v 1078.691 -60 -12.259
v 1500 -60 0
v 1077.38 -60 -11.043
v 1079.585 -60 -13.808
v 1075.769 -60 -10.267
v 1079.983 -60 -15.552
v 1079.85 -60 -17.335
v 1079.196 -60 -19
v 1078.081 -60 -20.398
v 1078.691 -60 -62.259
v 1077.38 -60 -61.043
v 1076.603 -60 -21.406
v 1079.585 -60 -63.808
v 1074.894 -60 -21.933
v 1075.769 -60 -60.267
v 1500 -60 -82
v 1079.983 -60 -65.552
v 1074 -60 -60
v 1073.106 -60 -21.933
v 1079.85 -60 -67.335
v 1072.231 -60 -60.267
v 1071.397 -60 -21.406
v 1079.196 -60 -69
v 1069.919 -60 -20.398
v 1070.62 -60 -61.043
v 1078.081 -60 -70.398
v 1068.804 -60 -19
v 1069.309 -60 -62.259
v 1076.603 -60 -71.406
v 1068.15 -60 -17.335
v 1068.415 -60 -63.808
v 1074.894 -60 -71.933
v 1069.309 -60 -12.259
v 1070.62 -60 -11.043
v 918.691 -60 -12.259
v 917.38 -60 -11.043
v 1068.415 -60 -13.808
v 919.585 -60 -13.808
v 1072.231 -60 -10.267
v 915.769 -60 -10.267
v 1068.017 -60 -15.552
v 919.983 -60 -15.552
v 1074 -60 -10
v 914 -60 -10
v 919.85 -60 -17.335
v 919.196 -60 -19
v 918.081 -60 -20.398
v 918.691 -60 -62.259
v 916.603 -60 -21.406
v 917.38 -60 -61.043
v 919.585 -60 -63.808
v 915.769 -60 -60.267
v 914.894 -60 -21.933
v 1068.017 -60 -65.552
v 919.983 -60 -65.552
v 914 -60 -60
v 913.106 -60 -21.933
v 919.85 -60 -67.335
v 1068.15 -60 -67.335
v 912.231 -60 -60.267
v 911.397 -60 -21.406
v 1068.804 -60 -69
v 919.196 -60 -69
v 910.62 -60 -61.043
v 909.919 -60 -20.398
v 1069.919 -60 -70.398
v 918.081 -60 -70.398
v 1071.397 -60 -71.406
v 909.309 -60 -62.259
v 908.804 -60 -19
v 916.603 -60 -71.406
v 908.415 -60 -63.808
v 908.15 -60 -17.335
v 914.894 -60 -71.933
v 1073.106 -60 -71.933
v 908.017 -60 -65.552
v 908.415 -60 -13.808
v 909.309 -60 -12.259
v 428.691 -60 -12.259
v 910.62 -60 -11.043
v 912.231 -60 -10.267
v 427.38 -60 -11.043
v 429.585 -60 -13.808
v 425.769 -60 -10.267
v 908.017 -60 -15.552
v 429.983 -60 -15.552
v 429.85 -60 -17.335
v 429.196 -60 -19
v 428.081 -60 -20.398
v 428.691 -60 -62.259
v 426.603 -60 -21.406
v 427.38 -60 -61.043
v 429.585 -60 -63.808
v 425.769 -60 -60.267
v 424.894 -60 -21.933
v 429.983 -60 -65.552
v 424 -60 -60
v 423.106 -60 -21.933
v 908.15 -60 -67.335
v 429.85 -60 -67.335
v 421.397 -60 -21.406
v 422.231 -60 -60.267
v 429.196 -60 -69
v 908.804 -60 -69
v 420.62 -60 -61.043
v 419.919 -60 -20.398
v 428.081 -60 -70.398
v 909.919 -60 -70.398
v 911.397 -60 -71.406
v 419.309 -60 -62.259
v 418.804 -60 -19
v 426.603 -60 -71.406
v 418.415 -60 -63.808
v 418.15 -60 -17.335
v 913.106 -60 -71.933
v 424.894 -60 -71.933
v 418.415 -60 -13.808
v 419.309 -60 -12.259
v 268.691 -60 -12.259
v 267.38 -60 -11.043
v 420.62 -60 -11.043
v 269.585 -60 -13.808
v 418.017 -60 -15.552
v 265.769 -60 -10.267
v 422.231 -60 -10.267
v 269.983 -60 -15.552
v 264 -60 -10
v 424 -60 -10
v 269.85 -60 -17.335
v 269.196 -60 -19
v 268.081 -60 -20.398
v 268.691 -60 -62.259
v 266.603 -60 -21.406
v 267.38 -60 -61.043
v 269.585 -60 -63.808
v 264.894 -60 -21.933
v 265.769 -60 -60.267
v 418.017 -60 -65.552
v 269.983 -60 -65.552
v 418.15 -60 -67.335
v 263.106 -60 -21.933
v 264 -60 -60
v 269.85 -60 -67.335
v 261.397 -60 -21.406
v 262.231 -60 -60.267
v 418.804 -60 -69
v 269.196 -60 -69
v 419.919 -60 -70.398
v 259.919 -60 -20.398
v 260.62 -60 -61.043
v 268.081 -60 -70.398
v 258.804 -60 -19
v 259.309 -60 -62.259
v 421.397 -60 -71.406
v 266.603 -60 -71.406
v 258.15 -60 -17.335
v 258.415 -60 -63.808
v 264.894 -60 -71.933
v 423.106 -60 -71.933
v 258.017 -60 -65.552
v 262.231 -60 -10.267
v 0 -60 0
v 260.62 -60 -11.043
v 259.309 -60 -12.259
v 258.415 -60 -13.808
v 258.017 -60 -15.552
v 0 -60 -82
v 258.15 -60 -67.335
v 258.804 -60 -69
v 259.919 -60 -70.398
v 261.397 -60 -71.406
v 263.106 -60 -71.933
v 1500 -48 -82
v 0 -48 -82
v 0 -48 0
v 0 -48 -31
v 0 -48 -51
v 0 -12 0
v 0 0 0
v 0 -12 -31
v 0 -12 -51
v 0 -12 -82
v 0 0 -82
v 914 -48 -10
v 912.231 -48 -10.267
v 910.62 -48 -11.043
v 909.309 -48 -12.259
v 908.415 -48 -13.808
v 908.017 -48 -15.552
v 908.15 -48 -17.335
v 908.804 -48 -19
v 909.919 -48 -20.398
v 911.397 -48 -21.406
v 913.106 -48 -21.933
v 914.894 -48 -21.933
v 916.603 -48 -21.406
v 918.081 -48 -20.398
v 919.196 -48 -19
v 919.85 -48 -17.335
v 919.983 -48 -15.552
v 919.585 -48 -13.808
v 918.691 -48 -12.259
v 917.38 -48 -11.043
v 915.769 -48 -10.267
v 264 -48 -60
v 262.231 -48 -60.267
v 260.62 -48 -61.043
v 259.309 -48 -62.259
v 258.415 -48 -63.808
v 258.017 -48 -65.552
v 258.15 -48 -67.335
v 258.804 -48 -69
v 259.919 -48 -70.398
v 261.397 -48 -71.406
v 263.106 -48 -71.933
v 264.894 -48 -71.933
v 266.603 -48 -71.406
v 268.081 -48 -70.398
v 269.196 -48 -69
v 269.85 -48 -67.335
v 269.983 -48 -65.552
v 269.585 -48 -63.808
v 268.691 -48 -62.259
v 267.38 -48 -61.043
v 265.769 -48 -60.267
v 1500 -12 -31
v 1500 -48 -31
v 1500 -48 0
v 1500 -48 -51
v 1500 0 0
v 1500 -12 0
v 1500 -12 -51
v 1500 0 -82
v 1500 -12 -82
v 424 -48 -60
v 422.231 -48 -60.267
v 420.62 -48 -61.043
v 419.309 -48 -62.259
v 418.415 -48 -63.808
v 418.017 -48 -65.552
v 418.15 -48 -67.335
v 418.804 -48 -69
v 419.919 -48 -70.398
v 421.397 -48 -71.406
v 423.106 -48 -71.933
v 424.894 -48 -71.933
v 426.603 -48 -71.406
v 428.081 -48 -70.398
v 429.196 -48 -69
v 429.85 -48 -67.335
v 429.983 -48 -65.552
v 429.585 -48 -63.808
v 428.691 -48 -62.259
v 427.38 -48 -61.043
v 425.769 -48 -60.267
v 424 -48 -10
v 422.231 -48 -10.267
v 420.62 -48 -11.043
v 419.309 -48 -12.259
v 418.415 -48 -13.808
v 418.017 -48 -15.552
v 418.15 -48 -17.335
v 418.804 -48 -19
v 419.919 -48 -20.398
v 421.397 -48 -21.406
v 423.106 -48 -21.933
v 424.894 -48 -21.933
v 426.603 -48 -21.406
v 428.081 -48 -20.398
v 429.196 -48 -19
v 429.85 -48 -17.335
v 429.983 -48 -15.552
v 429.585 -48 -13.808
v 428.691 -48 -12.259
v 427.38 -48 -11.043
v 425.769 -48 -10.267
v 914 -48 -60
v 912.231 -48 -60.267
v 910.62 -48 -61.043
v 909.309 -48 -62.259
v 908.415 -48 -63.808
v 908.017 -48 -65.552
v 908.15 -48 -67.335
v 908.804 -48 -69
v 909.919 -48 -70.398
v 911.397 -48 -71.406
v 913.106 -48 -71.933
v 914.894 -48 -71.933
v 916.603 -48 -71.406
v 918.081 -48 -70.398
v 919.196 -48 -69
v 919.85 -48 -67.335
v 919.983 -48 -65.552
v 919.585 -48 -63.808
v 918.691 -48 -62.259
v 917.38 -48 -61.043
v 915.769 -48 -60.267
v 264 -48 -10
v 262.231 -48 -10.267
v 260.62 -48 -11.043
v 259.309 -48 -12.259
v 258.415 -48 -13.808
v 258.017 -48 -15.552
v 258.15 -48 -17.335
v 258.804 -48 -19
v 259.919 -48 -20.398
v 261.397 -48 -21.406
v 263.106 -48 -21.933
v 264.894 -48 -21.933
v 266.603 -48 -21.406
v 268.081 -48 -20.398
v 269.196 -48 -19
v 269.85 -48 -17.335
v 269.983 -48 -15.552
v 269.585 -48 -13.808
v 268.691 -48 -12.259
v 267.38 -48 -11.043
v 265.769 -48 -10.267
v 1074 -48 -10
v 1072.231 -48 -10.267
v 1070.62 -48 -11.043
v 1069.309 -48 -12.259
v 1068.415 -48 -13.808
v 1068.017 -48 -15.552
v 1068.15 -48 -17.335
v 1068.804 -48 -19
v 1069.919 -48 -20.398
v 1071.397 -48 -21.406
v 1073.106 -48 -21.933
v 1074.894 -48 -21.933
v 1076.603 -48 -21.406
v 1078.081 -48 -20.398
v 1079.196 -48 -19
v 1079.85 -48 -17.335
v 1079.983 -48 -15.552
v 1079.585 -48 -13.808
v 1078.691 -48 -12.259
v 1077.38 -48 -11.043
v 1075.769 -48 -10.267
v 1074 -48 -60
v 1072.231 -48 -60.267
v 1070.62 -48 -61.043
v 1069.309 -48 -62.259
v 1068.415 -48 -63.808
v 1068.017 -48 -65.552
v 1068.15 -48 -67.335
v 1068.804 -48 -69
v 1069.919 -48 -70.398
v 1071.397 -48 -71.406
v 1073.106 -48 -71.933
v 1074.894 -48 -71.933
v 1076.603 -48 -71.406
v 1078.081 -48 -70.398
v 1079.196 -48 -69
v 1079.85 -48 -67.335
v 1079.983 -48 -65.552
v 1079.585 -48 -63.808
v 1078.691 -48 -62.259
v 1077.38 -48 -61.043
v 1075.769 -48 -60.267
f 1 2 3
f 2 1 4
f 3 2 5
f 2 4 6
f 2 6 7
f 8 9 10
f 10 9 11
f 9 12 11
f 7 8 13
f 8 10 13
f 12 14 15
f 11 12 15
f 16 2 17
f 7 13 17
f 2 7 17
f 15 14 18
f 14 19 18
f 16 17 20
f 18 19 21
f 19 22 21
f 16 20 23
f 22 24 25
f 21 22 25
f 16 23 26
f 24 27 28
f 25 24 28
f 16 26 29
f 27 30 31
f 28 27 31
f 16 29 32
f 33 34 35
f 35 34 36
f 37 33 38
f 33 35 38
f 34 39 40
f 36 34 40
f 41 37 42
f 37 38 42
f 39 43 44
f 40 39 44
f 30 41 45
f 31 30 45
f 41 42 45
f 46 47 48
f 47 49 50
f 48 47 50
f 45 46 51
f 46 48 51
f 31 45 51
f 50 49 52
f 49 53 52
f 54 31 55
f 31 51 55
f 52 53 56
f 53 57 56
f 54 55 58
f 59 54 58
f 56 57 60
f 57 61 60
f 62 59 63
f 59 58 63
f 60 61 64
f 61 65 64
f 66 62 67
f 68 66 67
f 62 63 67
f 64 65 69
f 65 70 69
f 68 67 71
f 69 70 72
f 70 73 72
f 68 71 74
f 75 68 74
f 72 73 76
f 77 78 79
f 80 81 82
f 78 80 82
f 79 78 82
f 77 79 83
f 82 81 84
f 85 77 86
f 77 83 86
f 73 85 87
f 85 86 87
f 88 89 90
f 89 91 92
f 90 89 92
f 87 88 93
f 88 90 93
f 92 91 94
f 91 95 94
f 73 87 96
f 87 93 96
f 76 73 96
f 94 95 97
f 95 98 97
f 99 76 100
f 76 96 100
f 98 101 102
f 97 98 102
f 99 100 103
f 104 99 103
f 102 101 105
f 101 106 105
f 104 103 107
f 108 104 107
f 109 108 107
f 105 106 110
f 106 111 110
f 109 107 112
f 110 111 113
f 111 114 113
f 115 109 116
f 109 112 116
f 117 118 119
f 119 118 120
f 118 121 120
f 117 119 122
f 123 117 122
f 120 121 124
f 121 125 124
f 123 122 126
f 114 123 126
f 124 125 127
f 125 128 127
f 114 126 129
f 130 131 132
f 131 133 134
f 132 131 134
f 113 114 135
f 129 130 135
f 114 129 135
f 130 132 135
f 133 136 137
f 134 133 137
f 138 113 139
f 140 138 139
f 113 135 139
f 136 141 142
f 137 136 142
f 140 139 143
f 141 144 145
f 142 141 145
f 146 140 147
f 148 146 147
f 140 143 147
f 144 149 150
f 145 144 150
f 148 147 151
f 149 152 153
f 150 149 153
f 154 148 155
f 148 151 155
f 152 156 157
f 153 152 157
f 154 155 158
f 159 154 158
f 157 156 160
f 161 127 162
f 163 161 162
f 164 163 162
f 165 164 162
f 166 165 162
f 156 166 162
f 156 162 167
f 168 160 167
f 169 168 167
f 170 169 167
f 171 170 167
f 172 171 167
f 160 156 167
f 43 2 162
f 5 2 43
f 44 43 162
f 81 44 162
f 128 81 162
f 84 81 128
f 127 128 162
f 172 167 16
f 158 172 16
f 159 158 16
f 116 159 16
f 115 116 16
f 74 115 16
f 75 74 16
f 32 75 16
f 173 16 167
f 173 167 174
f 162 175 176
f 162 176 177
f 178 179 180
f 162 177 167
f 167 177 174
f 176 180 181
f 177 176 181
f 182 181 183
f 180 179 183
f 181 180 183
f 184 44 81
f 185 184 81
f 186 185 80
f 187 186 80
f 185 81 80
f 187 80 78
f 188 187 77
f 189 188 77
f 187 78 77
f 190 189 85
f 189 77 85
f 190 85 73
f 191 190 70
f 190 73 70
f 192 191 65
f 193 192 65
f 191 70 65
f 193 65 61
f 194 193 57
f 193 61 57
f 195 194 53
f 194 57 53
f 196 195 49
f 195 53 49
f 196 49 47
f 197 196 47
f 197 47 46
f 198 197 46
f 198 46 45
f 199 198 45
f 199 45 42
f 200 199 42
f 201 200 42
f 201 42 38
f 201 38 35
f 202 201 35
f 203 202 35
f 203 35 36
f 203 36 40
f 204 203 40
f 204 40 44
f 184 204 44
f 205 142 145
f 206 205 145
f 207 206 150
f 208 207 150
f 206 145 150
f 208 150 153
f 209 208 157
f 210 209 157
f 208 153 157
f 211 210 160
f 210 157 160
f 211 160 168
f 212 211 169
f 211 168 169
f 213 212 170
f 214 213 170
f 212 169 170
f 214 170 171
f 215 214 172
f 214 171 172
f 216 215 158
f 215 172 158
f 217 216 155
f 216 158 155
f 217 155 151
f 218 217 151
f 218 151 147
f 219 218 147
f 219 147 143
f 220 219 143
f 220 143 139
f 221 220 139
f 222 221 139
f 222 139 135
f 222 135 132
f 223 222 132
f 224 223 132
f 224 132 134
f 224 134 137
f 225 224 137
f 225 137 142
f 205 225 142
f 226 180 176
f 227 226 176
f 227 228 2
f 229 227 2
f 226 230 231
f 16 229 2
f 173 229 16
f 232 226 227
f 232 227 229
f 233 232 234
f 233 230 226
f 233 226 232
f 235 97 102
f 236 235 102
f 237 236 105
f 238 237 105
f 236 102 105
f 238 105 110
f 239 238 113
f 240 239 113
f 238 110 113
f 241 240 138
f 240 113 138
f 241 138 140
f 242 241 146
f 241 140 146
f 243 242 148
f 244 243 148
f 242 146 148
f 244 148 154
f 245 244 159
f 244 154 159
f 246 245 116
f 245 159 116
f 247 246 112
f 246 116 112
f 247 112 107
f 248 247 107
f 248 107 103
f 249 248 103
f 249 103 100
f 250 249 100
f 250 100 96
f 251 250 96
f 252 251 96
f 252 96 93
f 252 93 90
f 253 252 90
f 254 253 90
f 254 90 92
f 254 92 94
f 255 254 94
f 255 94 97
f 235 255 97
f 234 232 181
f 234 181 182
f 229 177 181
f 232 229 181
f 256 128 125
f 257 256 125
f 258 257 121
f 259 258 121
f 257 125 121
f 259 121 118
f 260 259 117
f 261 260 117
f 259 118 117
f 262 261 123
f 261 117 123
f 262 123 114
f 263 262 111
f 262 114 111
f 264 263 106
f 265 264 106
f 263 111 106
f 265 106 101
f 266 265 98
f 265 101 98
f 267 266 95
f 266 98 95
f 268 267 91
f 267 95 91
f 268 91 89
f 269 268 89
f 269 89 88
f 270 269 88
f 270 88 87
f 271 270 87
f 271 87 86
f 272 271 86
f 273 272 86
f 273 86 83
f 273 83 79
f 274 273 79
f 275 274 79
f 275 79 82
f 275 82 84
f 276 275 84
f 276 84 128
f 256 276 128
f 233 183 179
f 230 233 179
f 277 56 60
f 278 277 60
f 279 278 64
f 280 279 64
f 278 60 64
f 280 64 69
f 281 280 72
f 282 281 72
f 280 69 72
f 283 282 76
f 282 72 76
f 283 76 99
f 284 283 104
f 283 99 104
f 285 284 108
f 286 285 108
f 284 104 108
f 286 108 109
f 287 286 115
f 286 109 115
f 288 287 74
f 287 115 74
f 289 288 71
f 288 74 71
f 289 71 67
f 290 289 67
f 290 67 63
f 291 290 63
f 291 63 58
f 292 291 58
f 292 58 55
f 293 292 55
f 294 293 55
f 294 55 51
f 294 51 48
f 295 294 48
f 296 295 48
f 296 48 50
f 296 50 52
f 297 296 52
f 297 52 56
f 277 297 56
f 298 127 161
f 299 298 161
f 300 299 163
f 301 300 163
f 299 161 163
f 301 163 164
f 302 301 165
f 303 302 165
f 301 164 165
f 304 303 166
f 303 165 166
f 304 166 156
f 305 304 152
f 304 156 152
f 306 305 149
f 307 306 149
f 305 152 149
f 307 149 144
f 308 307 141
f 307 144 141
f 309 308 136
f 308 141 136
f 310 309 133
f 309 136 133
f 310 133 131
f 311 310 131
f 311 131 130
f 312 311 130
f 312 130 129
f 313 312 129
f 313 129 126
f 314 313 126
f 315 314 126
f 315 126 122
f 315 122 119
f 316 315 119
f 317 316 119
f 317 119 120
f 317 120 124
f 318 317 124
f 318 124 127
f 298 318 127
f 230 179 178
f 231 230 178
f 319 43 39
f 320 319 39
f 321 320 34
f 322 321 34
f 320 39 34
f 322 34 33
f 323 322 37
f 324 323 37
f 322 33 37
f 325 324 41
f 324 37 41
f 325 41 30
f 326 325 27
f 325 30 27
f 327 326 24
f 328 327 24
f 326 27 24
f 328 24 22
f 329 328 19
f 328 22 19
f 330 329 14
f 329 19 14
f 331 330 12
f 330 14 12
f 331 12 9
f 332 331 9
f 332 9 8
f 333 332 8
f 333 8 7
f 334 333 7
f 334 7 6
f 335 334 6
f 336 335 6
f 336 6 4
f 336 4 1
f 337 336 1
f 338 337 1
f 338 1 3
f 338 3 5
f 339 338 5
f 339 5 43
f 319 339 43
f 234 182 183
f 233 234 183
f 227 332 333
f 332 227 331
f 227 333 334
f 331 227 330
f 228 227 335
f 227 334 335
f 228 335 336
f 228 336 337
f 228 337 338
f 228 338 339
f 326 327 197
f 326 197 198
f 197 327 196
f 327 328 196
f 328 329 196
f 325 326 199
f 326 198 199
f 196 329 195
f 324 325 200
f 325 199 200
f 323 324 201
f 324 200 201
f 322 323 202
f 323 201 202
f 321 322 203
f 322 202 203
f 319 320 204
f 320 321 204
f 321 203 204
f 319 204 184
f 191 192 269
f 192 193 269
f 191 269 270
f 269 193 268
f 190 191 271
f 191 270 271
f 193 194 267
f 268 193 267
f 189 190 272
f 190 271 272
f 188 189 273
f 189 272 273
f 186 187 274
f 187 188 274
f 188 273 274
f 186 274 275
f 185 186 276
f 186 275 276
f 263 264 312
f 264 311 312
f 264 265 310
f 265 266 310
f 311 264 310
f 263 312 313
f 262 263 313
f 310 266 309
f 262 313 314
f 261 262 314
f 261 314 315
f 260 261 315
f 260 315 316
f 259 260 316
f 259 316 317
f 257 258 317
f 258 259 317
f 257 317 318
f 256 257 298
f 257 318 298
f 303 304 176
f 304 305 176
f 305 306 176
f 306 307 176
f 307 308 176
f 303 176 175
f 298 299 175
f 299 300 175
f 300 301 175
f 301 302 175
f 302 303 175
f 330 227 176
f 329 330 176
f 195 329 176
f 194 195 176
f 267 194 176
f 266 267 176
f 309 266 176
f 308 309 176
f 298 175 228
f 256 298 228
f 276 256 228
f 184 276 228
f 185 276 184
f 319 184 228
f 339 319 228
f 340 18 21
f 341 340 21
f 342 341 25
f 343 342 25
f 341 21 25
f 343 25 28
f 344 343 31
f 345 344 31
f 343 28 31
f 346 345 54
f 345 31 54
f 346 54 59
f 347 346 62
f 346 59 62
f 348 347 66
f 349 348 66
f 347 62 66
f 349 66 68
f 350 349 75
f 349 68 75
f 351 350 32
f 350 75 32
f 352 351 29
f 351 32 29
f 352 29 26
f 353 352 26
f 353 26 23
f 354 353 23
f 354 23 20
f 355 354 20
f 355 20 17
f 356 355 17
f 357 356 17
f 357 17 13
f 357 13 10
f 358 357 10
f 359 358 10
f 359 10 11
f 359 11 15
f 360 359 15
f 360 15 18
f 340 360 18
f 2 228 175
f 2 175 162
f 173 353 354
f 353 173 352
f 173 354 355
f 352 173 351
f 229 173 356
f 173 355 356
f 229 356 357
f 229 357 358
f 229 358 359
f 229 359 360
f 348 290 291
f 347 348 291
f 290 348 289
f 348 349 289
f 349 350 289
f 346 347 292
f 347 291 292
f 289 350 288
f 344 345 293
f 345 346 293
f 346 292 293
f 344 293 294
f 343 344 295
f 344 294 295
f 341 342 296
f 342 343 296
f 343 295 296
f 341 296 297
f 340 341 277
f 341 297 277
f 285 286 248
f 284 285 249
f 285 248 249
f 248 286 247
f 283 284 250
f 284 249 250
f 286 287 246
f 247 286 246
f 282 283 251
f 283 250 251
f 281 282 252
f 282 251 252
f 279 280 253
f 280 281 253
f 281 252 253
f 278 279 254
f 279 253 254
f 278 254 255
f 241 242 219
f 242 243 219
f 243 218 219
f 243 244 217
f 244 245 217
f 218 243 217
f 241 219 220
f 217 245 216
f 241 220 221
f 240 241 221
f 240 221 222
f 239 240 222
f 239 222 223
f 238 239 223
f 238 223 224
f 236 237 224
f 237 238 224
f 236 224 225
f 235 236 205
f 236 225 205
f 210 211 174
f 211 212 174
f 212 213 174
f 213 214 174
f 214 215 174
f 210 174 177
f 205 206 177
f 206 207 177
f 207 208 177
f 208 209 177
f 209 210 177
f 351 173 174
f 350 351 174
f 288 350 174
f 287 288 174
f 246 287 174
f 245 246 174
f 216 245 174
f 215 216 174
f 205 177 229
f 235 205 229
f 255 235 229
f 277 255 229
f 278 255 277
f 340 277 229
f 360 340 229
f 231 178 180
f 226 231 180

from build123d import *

# Parameters (mm, degrees)
BOSS_EXTRUDE1_DEPTH            = 1500
CUT_EXTRUDE1_REACH             = 1505.437
SKETCH4_R                      = 6
CUT_EXTRUDE1_DIRECTION_2_DEPTH = 1504.437394772


with BuildPart() as part:
    # Sketch1 → Boss-Extrude1 (new body)
    with BuildSketch(Plane(origin=(0, 0, 0), x_dir=(0, 0, -1), z_dir=(1, 0, 0))):
        Polygon((51, -12), (82, -12), (82, 0), (0, 0), (0, -12), (31, -12), (31, -48), (0, -48), (0, -60), (82, -60), (82, -48), (51, -48), align=None)
    extrude(amount=BOSS_EXTRUDE1_DEPTH)

    # Sketch4 → Cut-Extrude1 (cut, up to next)
    with BuildSketch(Plane(origin=(0, -60, 0), x_dir=(-1, 0, 0), z_dir=(0, -1, 0)), mode=Mode.PRIVATE) as cut_extrude1_sk1:
        with Locations(Location((-424, 16, 0), (0, 0, 270))):
            Circle(SKETCH4_R)
    cut_extrude1_tool1 = extrude(cut_extrude1_sk1.sketch, amount=-CUT_EXTRUDE1_REACH, mode=Mode.PRIVATE) & part.part
    # Sketch4 → Cut-Extrude1 (cut, up to next)
    with BuildSketch(Plane(origin=(0, -60, 0), x_dir=(-1, 0, 0), z_dir=(0, -1, 0)), mode=Mode.PRIVATE) as cut_extrude1_sk2:
        with Locations(Location((-424, 66, 0), (0, 0, 270))):
            Circle(SKETCH4_R)
    cut_extrude1_tool2 = extrude(cut_extrude1_sk2.sketch, amount=-CUT_EXTRUDE1_REACH, mode=Mode.PRIVATE) & part.part
    # Sketch4 → Cut-Extrude1 (cut, up to next)
    with BuildSketch(Plane(origin=(0, -60, 0), x_dir=(-1, 0, 0), z_dir=(0, -1, 0)), mode=Mode.PRIVATE) as cut_extrude1_sk3:
        with Locations(Location((-264, 66, 0), (0, 0, 270))):
            Circle(SKETCH4_R)
    cut_extrude1_tool3 = extrude(cut_extrude1_sk3.sketch, amount=-CUT_EXTRUDE1_REACH, mode=Mode.PRIVATE) & part.part
    # Sketch4 → Cut-Extrude1 (cut, up to next)
    with BuildSketch(Plane(origin=(0, -60, 0), x_dir=(-1, 0, 0), z_dir=(0, -1, 0)), mode=Mode.PRIVATE) as cut_extrude1_sk4:
        with Locations(Location((-264, 16, 0), (0, 0, 270))):
            Circle(SKETCH4_R)
    cut_extrude1_tool4 = extrude(cut_extrude1_sk4.sketch, amount=-CUT_EXTRUDE1_REACH, mode=Mode.PRIVATE) & part.part
    # Sketch4 → Cut-Extrude1 (cut, up to next)
    with BuildSketch(Plane(origin=(0, -60, 0), x_dir=(-1, 0, 0), z_dir=(0, -1, 0)), mode=Mode.PRIVATE) as cut_extrude1_sk5:
        with Locations(Location((-1074, 66, 0), (0, 0, 270))):
            Circle(SKETCH4_R)
    cut_extrude1_tool5 = extrude(cut_extrude1_sk5.sketch, amount=-CUT_EXTRUDE1_REACH, mode=Mode.PRIVATE) & part.part
    # Sketch4 → Cut-Extrude1 (cut, up to next)
    with BuildSketch(Plane(origin=(0, -60, 0), x_dir=(-1, 0, 0), z_dir=(0, -1, 0)), mode=Mode.PRIVATE) as cut_extrude1_sk6:
        with Locations(Location((-914, 66, 0), (0, 0, 270))):
            Circle(SKETCH4_R)
    cut_extrude1_tool6 = extrude(cut_extrude1_sk6.sketch, amount=-CUT_EXTRUDE1_REACH, mode=Mode.PRIVATE) & part.part
    # Sketch4 → Cut-Extrude1 (cut, up to next)
    with BuildSketch(Plane(origin=(0, -60, 0), x_dir=(-1, 0, 0), z_dir=(0, -1, 0)), mode=Mode.PRIVATE) as cut_extrude1_sk7:
        with Locations(Location((-1074, 16, 0), (0, 0, 270))):
            Circle(SKETCH4_R)
    cut_extrude1_tool7 = extrude(cut_extrude1_sk7.sketch, amount=-CUT_EXTRUDE1_REACH, mode=Mode.PRIVATE) & part.part
    # Sketch4 → Cut-Extrude1 (cut, up to next)
    with BuildSketch(Plane(origin=(0, -60, 0), x_dir=(-1, 0, 0), z_dir=(0, -1, 0)), mode=Mode.PRIVATE) as cut_extrude1_sk8:
        with Locations(Location((-914, 16, 0), (0, 0, 270))):
            Circle(SKETCH4_R)
    cut_extrude1_tool8 = extrude(cut_extrude1_sk8.sketch, amount=-CUT_EXTRUDE1_REACH, mode=Mode.PRIVATE) & part.part
    add(cut_extrude1_tool1.solids().sort_by_distance((424, -60, -16))[0], mode=Mode.SUBTRACT)
    add(cut_extrude1_tool2.solids().sort_by_distance((424, -60, -66))[0], mode=Mode.SUBTRACT)
    add(cut_extrude1_tool3.solids().sort_by_distance((264, -60, -66))[0], mode=Mode.SUBTRACT)
    add(cut_extrude1_tool4.solids().sort_by_distance((264, -60, -16))[0], mode=Mode.SUBTRACT)
    add(cut_extrude1_tool5.solids().sort_by_distance((1074, -60, -66))[0], mode=Mode.SUBTRACT)
    add(cut_extrude1_tool6.solids().sort_by_distance((914, -60, -66))[0], mode=Mode.SUBTRACT)
    add(cut_extrude1_tool7.solids().sort_by_distance((1074, -60, -16))[0], mode=Mode.SUBTRACT)
    add(cut_extrude1_tool8.solids().sort_by_distance((914, -60, -16))[0], mode=Mode.SUBTRACT)

    # Sketch4 → Cut-Extrude1 direction 2 (cut)
    with BuildSketch(Plane(origin=(0, -60, 0), x_dir=(-1, 0, 0), z_dir=(0, -1, 0))):
        with Locations(Location((-424, 16, 0), (0, 0, 270))):
            Circle(SKETCH4_R)
        with Locations(Location((-424, 66, 0), (0, 0, 270))):
            Circle(SKETCH4_R)
        with Locations(Location((-264, 66, 0), (0, 0, 270))):
            Circle(SKETCH4_R)
        with Locations(Location((-264, 16, 0), (0, 0, 270))):
            Circle(SKETCH4_R)
        with Locations(Location((-1074, 66, 0), (0, 0, 270))):
            Circle(SKETCH4_R)
        with Locations(Location((-914, 66, 0), (0, 0, 270))):
            Circle(SKETCH4_R)
        with Locations(Location((-1074, 16, 0), (0, 0, 270))):
            Circle(SKETCH4_R)
        with Locations(Location((-914, 16, 0), (0, 0, 270))):
            Circle(SKETCH4_R)
    extrude(amount=CUT_EXTRUDE1_DIRECTION_2_DEPTH, mode=Mode.SUBTRACT)


solid = part.part
